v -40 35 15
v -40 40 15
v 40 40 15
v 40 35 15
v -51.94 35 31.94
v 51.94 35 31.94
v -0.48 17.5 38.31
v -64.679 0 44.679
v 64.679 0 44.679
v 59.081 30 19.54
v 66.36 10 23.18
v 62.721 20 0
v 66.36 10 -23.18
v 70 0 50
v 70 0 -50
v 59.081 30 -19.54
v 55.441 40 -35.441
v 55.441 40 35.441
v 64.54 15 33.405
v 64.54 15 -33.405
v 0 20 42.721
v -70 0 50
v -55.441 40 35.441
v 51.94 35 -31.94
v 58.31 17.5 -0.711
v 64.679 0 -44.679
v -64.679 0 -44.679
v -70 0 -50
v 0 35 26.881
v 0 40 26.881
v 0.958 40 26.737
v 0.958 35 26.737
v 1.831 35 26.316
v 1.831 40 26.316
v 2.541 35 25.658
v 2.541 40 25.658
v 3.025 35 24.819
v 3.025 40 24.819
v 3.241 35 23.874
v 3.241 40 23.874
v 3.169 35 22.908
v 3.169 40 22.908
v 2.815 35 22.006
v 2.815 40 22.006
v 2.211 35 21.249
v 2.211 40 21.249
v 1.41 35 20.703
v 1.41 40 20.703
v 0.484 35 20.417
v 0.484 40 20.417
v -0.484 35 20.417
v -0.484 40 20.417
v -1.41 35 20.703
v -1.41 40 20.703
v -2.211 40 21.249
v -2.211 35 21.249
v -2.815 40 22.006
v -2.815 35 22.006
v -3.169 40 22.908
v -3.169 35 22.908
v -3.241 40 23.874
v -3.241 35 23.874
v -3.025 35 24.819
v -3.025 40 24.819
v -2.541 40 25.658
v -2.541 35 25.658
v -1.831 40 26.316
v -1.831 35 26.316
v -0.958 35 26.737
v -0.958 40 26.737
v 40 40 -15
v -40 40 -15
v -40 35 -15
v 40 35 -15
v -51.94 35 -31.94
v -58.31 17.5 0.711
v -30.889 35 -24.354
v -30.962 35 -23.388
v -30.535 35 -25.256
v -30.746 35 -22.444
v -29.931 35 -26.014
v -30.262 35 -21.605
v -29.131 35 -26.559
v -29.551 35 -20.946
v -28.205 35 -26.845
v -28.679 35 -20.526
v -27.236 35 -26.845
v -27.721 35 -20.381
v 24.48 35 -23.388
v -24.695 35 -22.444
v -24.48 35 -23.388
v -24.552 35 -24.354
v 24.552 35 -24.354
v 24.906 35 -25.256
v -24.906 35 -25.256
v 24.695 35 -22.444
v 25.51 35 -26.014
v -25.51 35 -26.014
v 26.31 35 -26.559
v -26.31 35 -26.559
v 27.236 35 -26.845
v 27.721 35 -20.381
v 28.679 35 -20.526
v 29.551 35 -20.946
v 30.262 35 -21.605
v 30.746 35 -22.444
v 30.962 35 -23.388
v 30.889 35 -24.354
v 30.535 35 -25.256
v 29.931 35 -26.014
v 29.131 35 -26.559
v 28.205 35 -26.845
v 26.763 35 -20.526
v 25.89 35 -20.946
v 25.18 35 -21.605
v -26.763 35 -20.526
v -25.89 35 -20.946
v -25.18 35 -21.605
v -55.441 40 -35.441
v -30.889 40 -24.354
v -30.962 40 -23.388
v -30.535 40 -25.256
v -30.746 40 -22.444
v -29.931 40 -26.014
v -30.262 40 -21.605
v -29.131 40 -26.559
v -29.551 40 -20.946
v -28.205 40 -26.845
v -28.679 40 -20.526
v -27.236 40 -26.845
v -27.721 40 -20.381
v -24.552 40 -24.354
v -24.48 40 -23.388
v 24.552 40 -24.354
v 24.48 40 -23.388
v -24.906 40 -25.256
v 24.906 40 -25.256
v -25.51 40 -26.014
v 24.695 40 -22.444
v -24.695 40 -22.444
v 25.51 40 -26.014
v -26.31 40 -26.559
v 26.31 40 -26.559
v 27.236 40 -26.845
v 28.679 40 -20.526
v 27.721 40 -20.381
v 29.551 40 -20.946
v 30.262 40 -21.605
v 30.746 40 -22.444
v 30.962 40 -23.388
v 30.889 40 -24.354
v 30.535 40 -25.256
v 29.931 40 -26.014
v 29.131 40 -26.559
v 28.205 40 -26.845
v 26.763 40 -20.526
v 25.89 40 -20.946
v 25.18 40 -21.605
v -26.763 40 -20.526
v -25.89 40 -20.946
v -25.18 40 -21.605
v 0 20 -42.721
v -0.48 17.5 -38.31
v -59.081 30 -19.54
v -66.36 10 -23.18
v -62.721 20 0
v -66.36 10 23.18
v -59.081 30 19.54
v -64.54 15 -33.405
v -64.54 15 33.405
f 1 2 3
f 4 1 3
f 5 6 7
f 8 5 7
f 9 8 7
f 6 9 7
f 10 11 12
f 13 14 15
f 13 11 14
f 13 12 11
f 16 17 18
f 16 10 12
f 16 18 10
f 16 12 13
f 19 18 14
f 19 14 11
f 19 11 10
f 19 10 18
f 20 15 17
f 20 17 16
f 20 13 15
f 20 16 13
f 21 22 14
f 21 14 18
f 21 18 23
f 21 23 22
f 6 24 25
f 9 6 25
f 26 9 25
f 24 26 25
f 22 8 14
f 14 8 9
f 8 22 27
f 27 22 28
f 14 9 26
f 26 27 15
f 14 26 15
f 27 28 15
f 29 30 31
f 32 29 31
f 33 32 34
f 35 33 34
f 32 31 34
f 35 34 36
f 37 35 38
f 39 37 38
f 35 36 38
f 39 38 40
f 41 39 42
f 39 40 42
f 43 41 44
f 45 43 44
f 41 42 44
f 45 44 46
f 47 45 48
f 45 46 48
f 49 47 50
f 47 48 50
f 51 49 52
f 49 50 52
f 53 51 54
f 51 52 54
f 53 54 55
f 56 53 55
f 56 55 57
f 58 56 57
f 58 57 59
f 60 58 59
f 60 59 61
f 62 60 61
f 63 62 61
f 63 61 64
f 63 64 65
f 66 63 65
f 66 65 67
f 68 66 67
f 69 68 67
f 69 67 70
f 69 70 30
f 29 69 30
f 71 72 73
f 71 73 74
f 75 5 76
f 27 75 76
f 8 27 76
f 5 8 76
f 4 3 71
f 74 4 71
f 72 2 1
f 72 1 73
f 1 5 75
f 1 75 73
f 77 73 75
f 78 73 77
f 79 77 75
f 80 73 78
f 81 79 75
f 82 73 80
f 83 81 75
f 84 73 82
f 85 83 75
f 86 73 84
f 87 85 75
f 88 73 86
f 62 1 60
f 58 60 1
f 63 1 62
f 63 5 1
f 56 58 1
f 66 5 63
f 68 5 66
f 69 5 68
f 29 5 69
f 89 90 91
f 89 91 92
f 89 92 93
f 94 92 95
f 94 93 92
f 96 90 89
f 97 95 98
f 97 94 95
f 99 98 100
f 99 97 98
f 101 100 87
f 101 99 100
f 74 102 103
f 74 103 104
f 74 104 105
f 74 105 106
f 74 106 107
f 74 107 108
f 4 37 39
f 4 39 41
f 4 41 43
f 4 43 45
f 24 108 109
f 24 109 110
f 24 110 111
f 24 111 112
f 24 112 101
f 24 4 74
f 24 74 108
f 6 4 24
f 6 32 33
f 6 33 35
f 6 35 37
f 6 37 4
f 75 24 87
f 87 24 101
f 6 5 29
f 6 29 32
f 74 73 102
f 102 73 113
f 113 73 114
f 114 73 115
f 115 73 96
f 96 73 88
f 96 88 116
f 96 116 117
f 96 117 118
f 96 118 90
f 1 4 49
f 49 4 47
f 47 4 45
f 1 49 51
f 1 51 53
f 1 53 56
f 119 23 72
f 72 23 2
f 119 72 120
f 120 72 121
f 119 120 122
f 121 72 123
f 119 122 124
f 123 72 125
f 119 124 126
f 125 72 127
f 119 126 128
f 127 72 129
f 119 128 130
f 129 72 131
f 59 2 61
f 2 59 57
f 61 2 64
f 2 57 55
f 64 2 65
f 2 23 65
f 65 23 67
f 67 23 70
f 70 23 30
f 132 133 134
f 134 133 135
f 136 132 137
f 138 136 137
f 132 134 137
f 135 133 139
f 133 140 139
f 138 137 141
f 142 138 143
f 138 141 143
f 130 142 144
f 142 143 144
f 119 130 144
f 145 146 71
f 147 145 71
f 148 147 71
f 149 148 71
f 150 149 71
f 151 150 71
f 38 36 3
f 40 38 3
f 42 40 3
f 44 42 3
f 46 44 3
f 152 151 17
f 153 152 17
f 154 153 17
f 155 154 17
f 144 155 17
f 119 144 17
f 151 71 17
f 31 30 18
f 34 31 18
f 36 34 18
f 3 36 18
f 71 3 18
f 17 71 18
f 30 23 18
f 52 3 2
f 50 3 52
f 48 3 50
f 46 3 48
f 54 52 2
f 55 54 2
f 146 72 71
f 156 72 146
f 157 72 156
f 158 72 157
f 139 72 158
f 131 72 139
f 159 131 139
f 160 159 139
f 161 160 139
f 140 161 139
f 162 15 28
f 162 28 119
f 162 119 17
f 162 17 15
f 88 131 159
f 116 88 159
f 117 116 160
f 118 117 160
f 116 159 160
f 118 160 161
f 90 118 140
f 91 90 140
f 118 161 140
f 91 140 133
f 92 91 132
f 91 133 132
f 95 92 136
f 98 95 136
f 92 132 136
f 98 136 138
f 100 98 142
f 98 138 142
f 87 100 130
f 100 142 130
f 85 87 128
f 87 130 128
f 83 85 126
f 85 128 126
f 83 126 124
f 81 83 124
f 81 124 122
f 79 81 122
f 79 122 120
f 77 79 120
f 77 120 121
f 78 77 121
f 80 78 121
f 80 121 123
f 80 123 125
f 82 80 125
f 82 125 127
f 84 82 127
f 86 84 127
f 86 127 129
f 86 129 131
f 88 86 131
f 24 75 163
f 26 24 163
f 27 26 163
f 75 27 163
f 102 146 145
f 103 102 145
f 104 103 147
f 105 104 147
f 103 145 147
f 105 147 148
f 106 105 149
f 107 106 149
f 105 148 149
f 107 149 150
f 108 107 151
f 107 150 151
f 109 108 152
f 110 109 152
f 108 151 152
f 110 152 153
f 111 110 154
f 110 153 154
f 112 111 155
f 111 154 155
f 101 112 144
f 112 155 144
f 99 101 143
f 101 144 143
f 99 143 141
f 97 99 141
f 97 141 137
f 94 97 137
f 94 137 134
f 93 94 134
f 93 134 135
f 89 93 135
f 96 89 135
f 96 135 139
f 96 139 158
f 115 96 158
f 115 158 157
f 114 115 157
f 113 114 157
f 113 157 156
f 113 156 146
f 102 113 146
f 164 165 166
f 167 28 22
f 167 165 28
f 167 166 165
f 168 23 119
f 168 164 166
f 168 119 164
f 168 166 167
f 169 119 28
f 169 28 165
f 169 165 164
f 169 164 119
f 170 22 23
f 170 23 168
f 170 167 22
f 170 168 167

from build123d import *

# Parameters (mm, degrees)
SKETCH1_W           = 140
SKETCH1_H           = 100
BOSS_EXTRUDE2_DEPTH = 40
BOSS_EXTRUDE2_TAPER = 20
SHELL1_T            = -5
SKETCH3_R           = 3.25
SKETCH3_W           = 80
SKETCH3_H           = 30
CUT_EXTRUDE1_DEPTH  = 95.868329974


with BuildPart() as part:
    # Sketch1 → Boss-Extrude2 (new body)
    with BuildSketch(Plane(origin=(0, 0, 0), x_dir=(1, 0, 0), z_dir=(0, 1, 0))):
        Rectangle(SKETCH1_W, SKETCH1_H)
    extrude(amount=BOSS_EXTRUDE2_DEPTH, taper=BOSS_EXTRUDE2_TAPER)

    # Shell1
    shell1_openings = [part.faces().sort_by_distance(p)[0] for p in [
        (0, 0, 0),
    ]]
    offset(amount=SHELL1_T, openings=shell1_openings, kind=Kind.INTERSECTION)

    # Sketch3 → Cut-Extrude1 (cut, through all)
    with BuildSketch(Plane(origin=(0, 40, 0), x_dir=(1, 0, 0), z_dir=(0, 1, 0))):
        with Locations(Location((0, -23.631190629, 0), (0, 0, 270))):
            Circle(SKETCH3_R)
        with Locations(Location((-27.720595315, 23.631190629, 0), (0, 0, 270))):
            Circle(SKETCH3_R)
        with Locations(Location((27.720595315, 23.631190629, 0), (0, 0, 270))):
            Circle(SKETCH3_R)
        Rectangle(SKETCH3_W, SKETCH3_H)
    extrude(amount=-CUT_EXTRUDE1_DEPTH, mode=Mode.SUBTRACT)


solid = part.part
